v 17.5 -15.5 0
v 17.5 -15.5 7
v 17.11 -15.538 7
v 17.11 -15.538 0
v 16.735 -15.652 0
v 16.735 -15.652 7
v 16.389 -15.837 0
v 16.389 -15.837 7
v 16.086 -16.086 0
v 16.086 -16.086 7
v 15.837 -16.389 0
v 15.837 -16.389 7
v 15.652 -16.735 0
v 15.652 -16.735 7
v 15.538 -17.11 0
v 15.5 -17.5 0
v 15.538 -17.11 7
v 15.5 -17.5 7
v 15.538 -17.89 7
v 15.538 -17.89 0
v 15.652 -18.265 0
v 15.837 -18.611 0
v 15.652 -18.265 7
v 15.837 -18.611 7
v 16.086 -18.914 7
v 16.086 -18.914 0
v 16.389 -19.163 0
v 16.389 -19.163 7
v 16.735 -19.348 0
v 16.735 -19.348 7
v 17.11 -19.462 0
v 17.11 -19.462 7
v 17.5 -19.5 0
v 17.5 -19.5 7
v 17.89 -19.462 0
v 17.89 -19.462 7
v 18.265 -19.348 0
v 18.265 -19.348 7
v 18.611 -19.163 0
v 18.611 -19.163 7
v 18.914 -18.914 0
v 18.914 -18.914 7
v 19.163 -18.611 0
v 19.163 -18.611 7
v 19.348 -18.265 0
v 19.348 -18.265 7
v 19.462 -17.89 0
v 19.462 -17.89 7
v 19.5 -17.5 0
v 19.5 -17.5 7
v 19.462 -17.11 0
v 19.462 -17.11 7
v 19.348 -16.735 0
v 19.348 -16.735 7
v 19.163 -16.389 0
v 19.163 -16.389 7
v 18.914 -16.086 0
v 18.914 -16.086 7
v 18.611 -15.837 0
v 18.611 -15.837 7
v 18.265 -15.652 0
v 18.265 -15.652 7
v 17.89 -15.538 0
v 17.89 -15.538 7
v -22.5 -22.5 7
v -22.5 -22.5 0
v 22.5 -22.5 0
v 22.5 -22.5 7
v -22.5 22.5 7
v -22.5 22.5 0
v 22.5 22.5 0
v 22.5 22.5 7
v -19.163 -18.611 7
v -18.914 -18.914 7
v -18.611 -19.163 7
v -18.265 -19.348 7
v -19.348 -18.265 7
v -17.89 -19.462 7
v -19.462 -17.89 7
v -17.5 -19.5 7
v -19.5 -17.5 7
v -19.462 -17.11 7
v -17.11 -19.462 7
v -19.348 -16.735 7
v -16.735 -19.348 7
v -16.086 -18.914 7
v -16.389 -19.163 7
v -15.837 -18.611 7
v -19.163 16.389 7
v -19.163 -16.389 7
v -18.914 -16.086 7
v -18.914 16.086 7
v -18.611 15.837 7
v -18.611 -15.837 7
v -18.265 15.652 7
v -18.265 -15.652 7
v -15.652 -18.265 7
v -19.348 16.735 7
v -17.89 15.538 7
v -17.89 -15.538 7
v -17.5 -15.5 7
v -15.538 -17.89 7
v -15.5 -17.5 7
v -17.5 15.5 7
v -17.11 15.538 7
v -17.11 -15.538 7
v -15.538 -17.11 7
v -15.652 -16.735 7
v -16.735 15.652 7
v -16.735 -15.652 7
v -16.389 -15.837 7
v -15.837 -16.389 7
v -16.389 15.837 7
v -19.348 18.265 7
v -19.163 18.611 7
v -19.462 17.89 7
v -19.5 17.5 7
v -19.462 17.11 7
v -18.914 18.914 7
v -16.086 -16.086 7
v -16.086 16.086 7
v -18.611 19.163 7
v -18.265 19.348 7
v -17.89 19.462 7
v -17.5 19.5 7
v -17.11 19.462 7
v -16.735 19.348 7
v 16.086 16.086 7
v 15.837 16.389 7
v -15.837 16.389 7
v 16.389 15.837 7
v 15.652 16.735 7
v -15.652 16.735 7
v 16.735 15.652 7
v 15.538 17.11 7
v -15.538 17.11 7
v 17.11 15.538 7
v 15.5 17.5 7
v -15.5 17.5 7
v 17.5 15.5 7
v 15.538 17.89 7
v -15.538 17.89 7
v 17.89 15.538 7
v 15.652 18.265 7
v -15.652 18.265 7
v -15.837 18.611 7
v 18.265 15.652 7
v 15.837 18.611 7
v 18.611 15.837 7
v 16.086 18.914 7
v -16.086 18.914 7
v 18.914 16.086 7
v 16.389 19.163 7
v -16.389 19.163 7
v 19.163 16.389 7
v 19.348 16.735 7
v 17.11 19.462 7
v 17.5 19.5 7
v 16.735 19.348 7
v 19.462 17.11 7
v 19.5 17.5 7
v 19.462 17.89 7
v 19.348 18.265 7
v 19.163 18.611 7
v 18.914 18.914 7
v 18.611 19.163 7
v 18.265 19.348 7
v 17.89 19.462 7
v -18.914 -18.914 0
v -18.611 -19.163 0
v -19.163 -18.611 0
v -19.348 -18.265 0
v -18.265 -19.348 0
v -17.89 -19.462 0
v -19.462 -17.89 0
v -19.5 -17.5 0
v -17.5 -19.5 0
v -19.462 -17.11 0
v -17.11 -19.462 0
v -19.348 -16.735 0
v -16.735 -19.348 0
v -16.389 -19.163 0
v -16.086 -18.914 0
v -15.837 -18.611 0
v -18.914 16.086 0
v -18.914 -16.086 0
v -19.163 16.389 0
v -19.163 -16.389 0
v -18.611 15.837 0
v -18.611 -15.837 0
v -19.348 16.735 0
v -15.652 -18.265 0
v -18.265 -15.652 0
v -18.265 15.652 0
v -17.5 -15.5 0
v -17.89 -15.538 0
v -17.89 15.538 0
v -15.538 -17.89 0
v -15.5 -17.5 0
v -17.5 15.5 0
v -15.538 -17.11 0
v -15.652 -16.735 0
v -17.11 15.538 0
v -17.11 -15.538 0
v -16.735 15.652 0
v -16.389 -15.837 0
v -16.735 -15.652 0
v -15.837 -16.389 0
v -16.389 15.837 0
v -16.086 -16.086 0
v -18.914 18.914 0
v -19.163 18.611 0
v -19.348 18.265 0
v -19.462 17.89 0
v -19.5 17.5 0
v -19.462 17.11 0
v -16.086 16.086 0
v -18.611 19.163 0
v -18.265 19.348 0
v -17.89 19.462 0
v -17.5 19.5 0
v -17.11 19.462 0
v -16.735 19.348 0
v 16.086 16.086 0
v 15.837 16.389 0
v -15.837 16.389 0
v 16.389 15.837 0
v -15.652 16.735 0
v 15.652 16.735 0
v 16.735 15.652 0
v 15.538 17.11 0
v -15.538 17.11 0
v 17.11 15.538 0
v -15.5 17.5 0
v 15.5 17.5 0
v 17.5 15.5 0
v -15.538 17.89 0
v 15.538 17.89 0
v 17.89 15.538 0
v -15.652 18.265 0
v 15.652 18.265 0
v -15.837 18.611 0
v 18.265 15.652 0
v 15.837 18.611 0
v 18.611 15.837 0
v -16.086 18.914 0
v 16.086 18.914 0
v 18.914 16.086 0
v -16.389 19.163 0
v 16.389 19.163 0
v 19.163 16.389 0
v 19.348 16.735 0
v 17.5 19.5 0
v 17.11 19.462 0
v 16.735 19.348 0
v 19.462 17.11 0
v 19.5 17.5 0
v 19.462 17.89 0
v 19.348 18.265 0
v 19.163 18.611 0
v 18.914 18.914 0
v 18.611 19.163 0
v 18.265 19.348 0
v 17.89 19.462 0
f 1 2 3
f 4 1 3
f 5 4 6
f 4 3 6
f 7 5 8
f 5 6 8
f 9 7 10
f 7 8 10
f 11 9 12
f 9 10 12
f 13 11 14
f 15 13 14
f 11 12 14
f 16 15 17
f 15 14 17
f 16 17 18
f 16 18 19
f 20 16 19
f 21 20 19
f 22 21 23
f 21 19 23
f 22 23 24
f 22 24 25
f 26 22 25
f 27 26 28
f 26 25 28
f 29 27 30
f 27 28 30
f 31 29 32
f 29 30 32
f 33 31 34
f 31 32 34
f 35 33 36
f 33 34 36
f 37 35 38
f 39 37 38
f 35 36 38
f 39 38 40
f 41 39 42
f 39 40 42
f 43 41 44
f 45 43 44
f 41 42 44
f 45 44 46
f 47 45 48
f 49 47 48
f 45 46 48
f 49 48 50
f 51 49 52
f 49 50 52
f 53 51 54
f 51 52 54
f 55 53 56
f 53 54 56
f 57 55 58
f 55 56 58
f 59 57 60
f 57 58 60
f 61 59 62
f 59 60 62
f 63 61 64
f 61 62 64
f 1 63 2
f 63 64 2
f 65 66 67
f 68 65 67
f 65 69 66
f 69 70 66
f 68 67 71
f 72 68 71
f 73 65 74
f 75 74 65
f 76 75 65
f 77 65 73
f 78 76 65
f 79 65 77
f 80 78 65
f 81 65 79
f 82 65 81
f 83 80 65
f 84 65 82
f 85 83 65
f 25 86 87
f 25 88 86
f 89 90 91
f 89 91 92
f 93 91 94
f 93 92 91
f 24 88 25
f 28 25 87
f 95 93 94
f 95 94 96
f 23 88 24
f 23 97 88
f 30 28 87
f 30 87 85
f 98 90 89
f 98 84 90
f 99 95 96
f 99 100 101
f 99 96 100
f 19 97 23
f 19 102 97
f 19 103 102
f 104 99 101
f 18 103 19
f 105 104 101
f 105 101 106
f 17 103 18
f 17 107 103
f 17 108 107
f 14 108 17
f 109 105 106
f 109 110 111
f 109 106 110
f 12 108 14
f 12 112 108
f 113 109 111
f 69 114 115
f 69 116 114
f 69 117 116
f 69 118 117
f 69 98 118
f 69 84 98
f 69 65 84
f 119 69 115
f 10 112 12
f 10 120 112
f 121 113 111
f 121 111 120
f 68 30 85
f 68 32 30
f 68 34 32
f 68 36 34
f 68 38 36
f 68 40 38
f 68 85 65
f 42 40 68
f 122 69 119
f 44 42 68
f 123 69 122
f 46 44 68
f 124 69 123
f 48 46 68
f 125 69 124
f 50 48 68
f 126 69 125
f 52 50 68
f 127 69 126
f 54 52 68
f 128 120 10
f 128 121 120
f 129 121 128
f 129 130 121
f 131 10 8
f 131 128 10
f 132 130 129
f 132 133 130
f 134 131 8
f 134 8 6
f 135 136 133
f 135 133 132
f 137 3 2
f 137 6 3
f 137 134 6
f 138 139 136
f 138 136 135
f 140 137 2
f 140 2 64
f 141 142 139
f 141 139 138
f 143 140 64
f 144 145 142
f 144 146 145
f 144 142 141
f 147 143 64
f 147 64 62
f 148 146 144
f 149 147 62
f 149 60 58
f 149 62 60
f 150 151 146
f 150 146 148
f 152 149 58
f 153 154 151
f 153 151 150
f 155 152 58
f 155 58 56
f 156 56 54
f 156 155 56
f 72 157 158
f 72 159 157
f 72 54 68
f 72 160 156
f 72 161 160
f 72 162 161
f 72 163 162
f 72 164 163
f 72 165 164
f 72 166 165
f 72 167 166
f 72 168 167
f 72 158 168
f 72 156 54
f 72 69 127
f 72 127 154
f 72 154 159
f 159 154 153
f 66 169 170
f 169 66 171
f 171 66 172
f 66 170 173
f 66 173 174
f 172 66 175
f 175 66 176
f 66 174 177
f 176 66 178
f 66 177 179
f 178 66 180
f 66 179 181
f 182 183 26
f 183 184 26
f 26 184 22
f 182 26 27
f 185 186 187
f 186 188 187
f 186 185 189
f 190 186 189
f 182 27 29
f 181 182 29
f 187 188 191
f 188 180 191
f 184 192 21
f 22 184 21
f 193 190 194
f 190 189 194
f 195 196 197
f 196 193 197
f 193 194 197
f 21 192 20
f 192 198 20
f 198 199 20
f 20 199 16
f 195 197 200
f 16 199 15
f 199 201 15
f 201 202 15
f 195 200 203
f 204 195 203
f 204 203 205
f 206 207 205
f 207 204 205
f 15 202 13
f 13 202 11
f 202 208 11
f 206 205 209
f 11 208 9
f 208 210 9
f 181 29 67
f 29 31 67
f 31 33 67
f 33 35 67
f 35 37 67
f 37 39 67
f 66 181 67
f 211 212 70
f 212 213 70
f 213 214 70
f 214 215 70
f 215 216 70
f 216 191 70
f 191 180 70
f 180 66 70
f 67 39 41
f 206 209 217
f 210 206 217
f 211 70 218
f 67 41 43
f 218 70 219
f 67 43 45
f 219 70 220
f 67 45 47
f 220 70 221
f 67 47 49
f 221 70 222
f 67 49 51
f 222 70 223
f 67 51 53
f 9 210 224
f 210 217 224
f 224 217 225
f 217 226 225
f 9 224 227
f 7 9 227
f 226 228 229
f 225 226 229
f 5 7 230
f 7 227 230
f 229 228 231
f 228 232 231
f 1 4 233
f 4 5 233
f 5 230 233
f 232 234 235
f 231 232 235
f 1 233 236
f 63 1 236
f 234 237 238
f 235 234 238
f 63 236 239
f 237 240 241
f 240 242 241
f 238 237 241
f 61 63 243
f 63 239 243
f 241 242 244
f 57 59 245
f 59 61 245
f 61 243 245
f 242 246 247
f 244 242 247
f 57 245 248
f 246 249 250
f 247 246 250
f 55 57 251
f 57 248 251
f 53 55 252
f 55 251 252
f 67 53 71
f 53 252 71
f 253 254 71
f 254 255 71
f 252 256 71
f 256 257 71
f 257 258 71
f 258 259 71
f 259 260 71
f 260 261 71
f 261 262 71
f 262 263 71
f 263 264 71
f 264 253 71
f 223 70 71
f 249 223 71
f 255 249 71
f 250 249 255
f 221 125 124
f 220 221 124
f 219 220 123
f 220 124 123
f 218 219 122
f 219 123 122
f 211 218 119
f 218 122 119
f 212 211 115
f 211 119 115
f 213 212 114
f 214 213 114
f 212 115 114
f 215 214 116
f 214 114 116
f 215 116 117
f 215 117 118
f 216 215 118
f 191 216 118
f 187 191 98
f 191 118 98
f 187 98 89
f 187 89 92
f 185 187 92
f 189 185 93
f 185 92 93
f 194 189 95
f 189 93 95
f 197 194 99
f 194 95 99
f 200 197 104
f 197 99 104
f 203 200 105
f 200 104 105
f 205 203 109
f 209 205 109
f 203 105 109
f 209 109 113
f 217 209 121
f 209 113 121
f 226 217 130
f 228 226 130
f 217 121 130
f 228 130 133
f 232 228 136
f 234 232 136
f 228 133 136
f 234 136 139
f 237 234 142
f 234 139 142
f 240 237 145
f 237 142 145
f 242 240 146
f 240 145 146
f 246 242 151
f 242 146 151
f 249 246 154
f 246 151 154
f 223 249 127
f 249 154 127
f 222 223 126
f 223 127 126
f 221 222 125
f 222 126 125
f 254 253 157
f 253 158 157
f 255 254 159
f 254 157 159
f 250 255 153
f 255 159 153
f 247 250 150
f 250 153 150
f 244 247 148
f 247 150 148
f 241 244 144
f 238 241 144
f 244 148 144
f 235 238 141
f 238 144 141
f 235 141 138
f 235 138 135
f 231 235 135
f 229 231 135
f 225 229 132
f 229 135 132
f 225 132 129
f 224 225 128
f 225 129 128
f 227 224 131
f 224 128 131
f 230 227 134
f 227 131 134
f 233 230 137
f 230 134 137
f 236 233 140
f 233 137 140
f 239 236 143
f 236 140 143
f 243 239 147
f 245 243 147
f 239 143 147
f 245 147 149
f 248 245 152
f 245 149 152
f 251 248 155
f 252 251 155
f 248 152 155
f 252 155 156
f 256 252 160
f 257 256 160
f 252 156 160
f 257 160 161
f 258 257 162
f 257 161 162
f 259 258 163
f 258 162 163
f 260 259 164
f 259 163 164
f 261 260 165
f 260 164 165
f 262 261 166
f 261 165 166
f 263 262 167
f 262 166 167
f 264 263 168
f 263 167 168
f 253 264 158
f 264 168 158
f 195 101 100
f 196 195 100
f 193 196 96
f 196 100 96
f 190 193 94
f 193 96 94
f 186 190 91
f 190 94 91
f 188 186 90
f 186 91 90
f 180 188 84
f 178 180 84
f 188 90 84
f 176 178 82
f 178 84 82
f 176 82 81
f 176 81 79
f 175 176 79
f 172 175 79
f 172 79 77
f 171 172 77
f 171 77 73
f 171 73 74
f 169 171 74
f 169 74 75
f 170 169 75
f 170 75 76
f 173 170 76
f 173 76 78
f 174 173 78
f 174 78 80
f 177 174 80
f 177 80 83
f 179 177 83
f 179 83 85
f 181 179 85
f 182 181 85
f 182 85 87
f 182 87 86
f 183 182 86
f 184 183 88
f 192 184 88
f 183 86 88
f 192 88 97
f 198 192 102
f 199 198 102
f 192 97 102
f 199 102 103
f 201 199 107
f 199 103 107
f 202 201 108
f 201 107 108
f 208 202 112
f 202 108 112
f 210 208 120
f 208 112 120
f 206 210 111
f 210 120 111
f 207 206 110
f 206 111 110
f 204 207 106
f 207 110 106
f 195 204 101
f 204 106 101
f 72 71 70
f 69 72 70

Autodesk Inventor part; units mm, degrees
ref_plane "YZ Plane" through (0, 0, 0) normal (1, 0, 0) x (0, 1, 0)
ref_plane "XZ Plane" through (0, 0, 0) normal (0, 1, 0) x (-1, 0, 0)
ref_plane "XY Plane" through (0, 0, 0) normal (0, 0, 1) x (1, 0, 0)
sketch "Skizze1" plane through (0, 0, 0) normal (0, 0, 1) x (1, 0, 0)
  line L0 (-22.5, -22.5) -> (22.5, -22.5)
  line L1 (22.5, -22.5) -> (22.5, 22.5)
  line L2 (22.5, 22.5) -> (-22.5, 22.5)
  line L3 (-22.5, 22.5) -> (-22.5, -22.5)
  line L4 (-22.5, -22.5) -> (22.5, 22.5) construction
  line L5 (22.5, -22.5) -> (-22.5, 22.5) construction
  point P0 (0, 0)
  dimension "d0" = 45
  dimension "d1" = 45
extrude "Extrusion1" add sketch "Skizze1" along normal blind 7
sketch "Skizze2" plane through (0, 0, 0) normal (0, 0, -1) x (-1, 0, 0)
  line L0 (-22.5, -22.5) -> (-22.5, 22.5) projected
  line L1 (-22.5, 22.5) -> (22.5, 22.5) projected
  line L2 (22.5, 22.5) -> (22.5, -22.5) projected
  line L3 (22.5, -22.5) -> (-22.5, -22.5) projected
  point P0 (0, 0)
  point P1 (-17.5, 17.5)
  point P2 (17.5, 17.5)
  point P3 (17.5, -17.5)
  point P4 (-17.5, -17.5)
  dimension "d4" = 5
  dimension "d5" = 5
  dimension "d6" = 5
  dimension "d7" = 5
  dimension "d8" = 5
  dimension "d9" = 5
  dimension "d12" = 5
  dimension "d13" = 5
hole "Bohrung1" at (17.5, 17.5, 0) at (-17.5, 17.5, 0) at (-17.5, -17.5, 0) at (17.5, -17.5, 0) direction (0, 0, 1) diameter 4 end through all
sketch "Skizze3" plane through (0, 0, 0) normal (0, 0, -1) x (-1, 0, 0)
  line L0 (-22.5, 22.5) -> (22.5, 22.5) projected
  line L1 (-22.5, 22.5) -> (-12.5, 22.5)
  line L2 (-12.5, 22.5) -> (-12.5, 12.5)
  line L3 (-12.5, 12.5) -> (-22.5, 12.5)
  line L4 (-22.5, 12.5) -> (-22.5, 22.5)
  line L5 (22.5, 22.5) -> (12.5, 22.5)
  line L6 (12.5, 22.5) -> (12.5, 12.5)
  line L7 (12.5, 12.5) -> (22.5, 12.5)
  line L8 (22.5, 12.5) -> (22.5, 22.5)
  line L9 (22.5, 22.5) -> (22.5, -22.5) projected
  line L10 (22.5, -22.5) -> (12.5, -22.5)
  line L11 (12.5, -22.5) -> (12.5, -12.5)
  line L12 (12.5, -12.5) -> (22.5, -12.5)
  line L13 (22.5, -12.5) -> (22.5, -22.5)
  line L14 (22.5, -22.5) -> (-22.5, -22.5) projected
  line L15 (-22.5, -22.5) -> (-12.5, -22.5)
  line L16 (-12.5, -22.5) -> (-12.5, -12.5)
  line L17 (-12.5, -12.5) -> (-22.5, -12.5)
  line L18 (-22.5, -12.5) -> (-22.5, -22.5)
  point P0 (0, 0)
  dimension "d21" = 10
  dimension "d22" = 10
  dimension "d23" = 10
  dimension "d24" = 10
  dimension "d25" = 10
  dimension "d26" = 10
  dimension "d27" = 10
properties part number "Platte klein"
